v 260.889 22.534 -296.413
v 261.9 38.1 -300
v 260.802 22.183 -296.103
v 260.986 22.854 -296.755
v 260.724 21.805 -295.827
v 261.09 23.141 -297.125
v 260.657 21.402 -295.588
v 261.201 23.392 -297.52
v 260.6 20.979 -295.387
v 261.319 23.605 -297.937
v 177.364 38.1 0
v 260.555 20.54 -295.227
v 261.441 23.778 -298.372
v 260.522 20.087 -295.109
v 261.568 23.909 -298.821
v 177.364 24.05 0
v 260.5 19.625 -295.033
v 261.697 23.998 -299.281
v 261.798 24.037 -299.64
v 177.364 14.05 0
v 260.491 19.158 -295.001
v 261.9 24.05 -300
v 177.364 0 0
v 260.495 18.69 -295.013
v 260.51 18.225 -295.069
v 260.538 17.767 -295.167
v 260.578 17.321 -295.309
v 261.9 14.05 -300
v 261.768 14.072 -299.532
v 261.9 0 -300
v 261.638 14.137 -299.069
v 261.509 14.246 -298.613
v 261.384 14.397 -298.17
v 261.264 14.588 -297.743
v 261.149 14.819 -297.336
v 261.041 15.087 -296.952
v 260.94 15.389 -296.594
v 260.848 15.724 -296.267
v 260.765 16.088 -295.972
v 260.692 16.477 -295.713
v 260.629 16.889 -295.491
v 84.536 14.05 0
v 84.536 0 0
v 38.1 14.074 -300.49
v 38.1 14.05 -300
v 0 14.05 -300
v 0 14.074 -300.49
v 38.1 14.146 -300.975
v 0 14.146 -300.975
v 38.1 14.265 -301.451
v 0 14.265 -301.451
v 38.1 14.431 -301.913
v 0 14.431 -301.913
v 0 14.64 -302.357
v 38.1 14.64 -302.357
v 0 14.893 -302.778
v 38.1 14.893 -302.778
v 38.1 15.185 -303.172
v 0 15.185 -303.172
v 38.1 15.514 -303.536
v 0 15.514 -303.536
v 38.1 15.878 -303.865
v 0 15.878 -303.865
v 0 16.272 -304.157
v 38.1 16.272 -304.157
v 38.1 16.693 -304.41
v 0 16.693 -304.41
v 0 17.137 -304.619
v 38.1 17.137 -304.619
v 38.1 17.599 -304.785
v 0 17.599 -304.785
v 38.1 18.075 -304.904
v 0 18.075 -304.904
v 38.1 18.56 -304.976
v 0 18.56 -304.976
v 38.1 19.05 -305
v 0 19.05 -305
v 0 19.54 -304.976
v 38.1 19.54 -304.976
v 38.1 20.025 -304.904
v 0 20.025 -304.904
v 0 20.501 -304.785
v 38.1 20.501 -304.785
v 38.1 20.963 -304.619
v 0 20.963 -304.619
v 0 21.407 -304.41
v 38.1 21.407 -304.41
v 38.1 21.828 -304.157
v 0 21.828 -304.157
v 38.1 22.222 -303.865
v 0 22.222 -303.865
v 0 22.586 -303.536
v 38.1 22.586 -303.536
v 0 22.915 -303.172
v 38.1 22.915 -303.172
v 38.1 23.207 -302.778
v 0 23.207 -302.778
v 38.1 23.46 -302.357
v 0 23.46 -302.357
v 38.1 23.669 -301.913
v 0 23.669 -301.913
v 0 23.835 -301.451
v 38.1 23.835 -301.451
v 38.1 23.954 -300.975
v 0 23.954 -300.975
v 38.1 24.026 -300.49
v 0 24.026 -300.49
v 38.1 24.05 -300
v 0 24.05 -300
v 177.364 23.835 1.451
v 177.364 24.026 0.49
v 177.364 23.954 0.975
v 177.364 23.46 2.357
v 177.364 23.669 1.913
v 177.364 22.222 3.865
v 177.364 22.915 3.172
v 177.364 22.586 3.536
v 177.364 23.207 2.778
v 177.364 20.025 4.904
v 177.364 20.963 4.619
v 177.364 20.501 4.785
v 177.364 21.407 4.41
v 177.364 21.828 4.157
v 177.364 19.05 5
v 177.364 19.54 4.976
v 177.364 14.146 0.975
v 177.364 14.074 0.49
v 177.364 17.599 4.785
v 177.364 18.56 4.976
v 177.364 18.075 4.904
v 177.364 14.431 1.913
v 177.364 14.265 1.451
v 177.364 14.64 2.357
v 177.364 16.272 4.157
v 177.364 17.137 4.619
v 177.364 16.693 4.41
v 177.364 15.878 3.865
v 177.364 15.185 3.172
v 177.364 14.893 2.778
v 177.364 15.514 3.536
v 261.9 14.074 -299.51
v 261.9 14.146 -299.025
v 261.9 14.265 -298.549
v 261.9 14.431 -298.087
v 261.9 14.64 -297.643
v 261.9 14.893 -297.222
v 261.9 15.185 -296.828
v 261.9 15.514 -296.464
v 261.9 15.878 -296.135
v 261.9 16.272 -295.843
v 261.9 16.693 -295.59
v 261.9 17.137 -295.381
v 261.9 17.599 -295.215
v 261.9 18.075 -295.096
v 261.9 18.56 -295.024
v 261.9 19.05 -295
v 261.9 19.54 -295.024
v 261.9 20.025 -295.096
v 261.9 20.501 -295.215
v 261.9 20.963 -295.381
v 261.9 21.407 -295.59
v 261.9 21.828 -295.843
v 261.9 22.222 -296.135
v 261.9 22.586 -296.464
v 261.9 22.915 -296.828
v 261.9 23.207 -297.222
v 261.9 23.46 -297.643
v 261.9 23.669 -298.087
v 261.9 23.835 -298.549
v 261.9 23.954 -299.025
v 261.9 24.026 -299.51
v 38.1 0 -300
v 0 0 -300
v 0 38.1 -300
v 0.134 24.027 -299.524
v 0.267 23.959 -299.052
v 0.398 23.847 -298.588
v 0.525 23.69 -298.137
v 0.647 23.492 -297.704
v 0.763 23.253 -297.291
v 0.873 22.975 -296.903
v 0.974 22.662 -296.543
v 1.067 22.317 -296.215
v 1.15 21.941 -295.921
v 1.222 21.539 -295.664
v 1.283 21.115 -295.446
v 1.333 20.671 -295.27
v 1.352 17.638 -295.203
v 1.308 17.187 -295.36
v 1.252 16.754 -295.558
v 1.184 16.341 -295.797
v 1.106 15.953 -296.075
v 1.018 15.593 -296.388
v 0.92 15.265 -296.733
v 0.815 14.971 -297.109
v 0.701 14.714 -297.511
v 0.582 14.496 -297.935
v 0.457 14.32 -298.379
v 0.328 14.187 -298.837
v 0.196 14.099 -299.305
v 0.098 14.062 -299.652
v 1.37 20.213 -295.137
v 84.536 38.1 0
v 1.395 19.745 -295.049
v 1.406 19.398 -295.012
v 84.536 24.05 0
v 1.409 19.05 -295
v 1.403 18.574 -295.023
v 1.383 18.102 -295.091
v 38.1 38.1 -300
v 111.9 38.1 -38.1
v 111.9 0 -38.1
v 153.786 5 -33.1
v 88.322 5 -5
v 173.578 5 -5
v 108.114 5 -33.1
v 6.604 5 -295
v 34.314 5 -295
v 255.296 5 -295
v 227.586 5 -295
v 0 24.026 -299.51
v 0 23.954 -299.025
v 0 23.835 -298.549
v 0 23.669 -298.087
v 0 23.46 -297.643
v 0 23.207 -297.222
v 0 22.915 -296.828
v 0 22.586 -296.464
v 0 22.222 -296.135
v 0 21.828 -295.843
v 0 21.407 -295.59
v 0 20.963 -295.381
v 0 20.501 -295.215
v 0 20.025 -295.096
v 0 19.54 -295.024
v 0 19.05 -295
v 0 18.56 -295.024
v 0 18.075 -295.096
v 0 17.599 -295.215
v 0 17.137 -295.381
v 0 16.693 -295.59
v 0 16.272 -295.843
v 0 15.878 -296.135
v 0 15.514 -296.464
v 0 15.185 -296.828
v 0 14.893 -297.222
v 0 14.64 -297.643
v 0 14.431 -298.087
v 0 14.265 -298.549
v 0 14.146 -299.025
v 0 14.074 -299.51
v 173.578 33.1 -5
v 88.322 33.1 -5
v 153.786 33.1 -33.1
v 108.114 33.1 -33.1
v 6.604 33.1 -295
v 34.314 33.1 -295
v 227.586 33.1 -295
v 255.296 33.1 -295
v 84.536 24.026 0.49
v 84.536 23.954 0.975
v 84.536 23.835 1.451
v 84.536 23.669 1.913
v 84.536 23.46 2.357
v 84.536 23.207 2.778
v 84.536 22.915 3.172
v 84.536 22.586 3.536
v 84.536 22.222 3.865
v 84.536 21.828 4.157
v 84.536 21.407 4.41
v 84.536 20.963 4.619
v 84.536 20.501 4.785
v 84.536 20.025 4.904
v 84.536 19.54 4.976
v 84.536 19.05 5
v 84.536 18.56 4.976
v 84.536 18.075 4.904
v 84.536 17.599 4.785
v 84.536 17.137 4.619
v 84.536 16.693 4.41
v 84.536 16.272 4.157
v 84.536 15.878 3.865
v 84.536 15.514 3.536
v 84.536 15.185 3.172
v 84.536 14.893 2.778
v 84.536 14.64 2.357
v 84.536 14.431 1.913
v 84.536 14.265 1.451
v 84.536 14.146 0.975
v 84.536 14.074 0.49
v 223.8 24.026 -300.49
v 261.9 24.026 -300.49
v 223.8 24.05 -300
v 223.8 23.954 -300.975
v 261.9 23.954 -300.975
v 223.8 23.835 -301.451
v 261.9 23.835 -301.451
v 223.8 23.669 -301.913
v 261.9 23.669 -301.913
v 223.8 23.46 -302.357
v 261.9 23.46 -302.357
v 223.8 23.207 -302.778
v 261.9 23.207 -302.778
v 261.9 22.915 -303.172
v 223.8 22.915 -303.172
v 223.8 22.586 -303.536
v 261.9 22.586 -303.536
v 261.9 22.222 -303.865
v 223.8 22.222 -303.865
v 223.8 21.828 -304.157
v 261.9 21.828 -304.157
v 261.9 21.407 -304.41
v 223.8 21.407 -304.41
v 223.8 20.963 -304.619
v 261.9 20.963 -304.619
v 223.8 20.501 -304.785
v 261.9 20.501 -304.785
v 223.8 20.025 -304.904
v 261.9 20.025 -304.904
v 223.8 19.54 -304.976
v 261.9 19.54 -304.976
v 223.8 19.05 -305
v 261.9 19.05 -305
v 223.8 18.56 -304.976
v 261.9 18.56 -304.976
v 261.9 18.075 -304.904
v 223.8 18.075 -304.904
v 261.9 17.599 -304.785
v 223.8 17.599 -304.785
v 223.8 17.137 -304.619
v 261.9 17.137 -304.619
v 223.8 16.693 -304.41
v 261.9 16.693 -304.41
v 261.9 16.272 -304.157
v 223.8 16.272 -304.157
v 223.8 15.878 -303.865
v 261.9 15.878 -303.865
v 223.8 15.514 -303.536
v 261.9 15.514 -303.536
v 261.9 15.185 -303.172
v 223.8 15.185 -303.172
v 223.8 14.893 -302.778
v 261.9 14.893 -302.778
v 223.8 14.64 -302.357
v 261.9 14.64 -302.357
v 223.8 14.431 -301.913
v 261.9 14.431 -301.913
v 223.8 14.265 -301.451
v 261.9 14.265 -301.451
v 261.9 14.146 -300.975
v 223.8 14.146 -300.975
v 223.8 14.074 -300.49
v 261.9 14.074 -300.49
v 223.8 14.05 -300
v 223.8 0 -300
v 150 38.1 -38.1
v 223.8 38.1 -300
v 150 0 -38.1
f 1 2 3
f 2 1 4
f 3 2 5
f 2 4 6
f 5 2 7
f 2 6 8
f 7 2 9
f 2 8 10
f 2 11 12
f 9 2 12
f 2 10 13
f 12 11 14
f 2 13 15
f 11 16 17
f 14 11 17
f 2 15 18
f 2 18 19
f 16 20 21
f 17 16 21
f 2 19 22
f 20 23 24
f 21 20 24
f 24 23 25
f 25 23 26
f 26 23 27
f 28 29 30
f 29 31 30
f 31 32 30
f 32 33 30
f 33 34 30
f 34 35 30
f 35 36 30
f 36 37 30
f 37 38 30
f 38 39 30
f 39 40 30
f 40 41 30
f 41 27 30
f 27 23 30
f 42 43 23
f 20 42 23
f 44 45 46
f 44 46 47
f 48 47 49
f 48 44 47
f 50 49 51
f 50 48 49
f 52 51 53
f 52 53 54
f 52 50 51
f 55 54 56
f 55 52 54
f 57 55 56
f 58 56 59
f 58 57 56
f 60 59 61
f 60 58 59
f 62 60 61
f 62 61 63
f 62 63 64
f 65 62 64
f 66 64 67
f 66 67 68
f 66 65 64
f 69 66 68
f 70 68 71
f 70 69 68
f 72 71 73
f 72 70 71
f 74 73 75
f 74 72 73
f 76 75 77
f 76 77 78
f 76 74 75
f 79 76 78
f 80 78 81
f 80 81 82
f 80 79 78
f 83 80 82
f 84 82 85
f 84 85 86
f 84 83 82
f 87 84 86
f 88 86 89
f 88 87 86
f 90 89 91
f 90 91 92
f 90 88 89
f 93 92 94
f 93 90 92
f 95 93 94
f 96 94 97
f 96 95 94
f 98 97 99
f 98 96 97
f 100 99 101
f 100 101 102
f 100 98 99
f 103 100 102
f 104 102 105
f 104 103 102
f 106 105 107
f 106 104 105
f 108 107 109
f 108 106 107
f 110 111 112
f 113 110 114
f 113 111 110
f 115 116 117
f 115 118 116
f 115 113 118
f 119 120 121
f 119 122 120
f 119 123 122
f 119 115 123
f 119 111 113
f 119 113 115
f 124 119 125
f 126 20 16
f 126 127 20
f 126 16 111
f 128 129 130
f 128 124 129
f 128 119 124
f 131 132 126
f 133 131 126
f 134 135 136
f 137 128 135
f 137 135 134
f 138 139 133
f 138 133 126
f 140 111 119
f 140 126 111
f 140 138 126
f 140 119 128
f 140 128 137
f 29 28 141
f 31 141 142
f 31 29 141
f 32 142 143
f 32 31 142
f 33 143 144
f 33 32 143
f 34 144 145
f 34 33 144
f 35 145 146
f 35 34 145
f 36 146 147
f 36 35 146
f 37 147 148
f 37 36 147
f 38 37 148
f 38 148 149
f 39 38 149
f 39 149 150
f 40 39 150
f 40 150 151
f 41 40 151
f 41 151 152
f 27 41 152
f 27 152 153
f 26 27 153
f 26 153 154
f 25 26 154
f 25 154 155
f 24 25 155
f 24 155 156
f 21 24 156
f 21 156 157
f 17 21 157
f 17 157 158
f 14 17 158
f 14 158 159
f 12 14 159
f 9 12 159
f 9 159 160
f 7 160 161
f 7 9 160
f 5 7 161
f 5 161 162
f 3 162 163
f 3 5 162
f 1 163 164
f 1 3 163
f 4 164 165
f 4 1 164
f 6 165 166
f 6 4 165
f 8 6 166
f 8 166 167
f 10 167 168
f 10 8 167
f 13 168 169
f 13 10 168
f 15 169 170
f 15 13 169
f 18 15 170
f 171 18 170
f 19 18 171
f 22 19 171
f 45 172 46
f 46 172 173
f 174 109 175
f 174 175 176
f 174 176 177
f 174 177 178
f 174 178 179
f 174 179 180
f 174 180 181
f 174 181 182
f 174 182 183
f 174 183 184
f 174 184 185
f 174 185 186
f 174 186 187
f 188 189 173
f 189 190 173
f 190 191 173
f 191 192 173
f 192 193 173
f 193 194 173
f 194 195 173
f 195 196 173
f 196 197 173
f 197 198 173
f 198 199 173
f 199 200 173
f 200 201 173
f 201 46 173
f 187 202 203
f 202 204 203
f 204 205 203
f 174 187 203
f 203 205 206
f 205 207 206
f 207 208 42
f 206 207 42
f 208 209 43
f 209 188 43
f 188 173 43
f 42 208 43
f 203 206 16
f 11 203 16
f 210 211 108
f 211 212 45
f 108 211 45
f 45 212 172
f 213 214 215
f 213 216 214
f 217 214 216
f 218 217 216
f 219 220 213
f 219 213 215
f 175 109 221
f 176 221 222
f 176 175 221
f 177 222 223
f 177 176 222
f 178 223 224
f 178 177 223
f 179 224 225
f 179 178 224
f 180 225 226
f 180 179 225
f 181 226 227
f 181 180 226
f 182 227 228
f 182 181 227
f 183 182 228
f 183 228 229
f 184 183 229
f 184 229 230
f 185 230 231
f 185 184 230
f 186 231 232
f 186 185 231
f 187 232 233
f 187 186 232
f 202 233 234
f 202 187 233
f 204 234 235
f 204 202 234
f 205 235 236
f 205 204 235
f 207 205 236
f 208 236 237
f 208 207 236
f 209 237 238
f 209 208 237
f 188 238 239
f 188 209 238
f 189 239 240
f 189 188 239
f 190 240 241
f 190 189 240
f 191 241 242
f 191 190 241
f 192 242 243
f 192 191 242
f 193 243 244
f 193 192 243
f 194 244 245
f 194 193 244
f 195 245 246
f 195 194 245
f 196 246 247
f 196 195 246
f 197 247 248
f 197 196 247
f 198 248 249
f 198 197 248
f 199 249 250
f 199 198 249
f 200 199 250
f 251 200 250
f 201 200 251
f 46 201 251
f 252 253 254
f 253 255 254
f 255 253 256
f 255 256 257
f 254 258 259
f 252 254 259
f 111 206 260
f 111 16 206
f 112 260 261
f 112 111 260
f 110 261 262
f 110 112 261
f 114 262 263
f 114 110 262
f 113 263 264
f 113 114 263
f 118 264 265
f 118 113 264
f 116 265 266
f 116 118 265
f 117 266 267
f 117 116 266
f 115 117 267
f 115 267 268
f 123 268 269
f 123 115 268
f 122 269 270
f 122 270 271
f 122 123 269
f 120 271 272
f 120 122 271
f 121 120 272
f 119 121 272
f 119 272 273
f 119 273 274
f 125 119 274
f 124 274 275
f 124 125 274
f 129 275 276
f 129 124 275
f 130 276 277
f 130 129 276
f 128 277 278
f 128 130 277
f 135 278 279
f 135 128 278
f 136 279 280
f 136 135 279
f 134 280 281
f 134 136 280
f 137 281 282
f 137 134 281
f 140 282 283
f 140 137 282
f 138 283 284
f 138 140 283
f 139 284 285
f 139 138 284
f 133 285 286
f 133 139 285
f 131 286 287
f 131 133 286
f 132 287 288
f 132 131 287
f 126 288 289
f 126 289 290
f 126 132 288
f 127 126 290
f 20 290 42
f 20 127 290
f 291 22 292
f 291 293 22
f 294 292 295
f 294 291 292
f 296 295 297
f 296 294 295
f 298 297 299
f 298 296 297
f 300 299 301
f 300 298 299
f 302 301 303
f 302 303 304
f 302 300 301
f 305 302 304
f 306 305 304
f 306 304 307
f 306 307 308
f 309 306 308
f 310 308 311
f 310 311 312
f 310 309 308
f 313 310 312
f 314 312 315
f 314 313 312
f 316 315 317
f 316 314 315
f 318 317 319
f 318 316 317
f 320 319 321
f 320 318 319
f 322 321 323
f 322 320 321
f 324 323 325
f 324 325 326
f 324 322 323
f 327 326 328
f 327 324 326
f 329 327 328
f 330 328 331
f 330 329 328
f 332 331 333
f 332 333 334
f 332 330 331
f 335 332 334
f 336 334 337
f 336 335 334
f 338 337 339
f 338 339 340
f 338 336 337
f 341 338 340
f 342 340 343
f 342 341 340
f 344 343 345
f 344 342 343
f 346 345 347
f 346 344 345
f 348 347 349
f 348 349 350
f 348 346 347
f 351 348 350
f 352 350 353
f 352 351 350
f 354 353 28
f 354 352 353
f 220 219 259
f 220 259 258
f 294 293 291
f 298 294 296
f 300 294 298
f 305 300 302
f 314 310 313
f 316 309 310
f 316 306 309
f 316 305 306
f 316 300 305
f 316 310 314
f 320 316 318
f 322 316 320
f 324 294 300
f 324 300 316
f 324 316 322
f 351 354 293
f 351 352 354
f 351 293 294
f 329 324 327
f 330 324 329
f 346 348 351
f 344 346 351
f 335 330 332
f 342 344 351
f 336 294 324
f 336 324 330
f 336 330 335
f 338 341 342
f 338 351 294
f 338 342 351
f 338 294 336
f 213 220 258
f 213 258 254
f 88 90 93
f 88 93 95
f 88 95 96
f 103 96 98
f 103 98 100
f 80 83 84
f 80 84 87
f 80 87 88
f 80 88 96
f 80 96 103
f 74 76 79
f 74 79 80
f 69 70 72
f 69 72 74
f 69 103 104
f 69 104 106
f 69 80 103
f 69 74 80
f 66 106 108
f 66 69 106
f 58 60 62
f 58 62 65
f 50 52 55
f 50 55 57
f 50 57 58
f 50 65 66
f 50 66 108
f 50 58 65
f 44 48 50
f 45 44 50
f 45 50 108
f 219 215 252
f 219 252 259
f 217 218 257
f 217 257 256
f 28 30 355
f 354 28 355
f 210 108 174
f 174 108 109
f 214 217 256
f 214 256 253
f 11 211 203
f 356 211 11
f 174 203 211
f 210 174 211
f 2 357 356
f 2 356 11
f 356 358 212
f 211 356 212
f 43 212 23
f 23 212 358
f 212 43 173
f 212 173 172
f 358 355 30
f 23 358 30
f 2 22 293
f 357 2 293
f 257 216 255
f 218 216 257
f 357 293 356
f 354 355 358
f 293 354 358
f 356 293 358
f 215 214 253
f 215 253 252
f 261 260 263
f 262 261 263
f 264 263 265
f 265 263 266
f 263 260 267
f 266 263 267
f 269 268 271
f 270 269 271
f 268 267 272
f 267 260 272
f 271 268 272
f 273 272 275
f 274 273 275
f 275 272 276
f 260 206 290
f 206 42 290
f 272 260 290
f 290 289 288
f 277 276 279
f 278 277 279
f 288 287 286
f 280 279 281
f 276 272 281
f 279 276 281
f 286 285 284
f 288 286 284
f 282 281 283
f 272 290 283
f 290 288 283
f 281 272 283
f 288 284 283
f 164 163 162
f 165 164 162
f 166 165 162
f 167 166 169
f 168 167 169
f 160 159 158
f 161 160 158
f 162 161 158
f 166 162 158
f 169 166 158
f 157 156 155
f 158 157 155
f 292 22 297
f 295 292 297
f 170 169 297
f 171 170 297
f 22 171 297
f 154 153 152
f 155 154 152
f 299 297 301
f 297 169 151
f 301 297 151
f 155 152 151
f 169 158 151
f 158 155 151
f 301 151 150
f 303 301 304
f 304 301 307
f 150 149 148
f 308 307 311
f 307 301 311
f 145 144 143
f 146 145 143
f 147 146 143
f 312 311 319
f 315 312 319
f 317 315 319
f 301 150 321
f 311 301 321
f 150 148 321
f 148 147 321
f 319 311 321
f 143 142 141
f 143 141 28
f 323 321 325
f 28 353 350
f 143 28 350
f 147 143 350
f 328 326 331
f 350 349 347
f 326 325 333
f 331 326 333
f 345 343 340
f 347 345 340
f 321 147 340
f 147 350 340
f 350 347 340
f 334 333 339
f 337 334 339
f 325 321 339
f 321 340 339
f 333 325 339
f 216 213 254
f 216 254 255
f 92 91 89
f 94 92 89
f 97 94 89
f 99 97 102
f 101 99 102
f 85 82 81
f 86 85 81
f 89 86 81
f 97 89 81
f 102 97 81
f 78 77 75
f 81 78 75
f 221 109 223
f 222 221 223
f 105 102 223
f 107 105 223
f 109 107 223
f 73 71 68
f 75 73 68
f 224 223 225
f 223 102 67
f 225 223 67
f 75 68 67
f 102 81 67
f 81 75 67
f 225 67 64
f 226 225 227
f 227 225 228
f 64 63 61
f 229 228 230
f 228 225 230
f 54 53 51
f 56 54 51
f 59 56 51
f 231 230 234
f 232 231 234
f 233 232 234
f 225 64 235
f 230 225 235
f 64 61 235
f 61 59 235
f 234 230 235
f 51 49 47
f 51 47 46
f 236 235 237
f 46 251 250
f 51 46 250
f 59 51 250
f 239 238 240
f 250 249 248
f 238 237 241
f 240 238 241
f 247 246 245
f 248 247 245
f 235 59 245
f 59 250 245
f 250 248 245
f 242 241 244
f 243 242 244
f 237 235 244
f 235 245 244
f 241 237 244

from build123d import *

# Parameters (mm, degrees)
BOSS_EXTRUDE1_DEPTH = 38.1
SWEEP1_PROFILE_R    = 5
SWEEP2_PROFILE_R    = 5
SWEEP4_PROFILE_R    = 5
SHELL4_START        = 5
SHELL4_DEPTH        = 28.1


# Read off the part's stored shape, not the designer's step: Shell4
with BuildPart() as part:
    # Sketch1 → Boss-Extrude1 (new body)
    with BuildSketch(Plane(origin=(0, 0, 0), x_dir=(1, 0, 0), z_dir=(0, 1, 0))):
        Polygon((111.9, 0), (150, 0), (177.363917526, 0), (261.9, 300), (223.8, 300), (150, 38.1), (111.9, 38.1), (38.1, 300), (0, 300), (84.536082474, 0), align=None)
    extrude(amount=BOSS_EXTRUDE1_DEPTH)

    # Sweep1: sweep along a path in Sketch2
    with BuildLine(Plane.XY) as sweep1_path:
        Line((84.536082474, 19.05), (177.363917526, 19.05))
    # Sweep1 profile (on start of the path) → Sweep1 (sweep)
    with BuildSketch(Plane(origin=(84.536082474, 19.05, 0), x_dir=(0, 0, 1), z_dir=(1, 0, 0))):
        Circle(SWEEP1_PROFILE_R)
    sweep(path=sweep1_path.line)

    # Sweep2: sweep along a path in Sketch11
    with BuildLine(Plane(origin=(0, 0, -300), x_dir=(-1, 0, 0), z_dir=(0, 0, -1))) as sweep2_path:
        Line((0, 19.05), (-38.1, 19.05))
    # Sweep2 profile (on start of the path) → Sweep2 (sweep)
    with BuildSketch(Plane(origin=(0, 19.05, -300), x_dir=(0, 0, 1), z_dir=(1, 0, 0))):
        Circle(SWEEP2_PROFILE_R)
    sweep(path=sweep2_path.line)

    # Sweep4: sweep along a path in Sketch16
    with BuildLine(Plane(origin=(0, 0, -300), x_dir=(-1, 0, 0), z_dir=(0, 0, -1))) as sweep4_path:
        Line((-261.9, 19.05), (-223.8, 19.05))
    # Sweep4 profile (on start of the path) → Sweep4 (sweep)
    with BuildSketch(Plane(origin=(261.9, 19.05, -300), x_dir=(0, 0, -1), z_dir=(-1, 0, 0))):
        Circle(SWEEP4_PROFILE_R)
    sweep(path=sweep4_path.line)

    # Shell4 outline → Shell4 (cut)
    with BuildSketch(Plane(origin=(0, 0, 0), x_dir=(1, 0, 0), z_dir=(0, 1, 0)).offset(SHELL4_START)):
        Polygon((255.296347108, 295), (227.585783476, 295), (153.785783476, 33.1), (108.114216524, 33.1), (34.314216524, 295), (6.603652892, 295), (88.32186595, 5), (173.57813405, 5), align=None)
    extrude(amount=SHELL4_DEPTH, mode=Mode.SUBTRACT)


solid = part.part
